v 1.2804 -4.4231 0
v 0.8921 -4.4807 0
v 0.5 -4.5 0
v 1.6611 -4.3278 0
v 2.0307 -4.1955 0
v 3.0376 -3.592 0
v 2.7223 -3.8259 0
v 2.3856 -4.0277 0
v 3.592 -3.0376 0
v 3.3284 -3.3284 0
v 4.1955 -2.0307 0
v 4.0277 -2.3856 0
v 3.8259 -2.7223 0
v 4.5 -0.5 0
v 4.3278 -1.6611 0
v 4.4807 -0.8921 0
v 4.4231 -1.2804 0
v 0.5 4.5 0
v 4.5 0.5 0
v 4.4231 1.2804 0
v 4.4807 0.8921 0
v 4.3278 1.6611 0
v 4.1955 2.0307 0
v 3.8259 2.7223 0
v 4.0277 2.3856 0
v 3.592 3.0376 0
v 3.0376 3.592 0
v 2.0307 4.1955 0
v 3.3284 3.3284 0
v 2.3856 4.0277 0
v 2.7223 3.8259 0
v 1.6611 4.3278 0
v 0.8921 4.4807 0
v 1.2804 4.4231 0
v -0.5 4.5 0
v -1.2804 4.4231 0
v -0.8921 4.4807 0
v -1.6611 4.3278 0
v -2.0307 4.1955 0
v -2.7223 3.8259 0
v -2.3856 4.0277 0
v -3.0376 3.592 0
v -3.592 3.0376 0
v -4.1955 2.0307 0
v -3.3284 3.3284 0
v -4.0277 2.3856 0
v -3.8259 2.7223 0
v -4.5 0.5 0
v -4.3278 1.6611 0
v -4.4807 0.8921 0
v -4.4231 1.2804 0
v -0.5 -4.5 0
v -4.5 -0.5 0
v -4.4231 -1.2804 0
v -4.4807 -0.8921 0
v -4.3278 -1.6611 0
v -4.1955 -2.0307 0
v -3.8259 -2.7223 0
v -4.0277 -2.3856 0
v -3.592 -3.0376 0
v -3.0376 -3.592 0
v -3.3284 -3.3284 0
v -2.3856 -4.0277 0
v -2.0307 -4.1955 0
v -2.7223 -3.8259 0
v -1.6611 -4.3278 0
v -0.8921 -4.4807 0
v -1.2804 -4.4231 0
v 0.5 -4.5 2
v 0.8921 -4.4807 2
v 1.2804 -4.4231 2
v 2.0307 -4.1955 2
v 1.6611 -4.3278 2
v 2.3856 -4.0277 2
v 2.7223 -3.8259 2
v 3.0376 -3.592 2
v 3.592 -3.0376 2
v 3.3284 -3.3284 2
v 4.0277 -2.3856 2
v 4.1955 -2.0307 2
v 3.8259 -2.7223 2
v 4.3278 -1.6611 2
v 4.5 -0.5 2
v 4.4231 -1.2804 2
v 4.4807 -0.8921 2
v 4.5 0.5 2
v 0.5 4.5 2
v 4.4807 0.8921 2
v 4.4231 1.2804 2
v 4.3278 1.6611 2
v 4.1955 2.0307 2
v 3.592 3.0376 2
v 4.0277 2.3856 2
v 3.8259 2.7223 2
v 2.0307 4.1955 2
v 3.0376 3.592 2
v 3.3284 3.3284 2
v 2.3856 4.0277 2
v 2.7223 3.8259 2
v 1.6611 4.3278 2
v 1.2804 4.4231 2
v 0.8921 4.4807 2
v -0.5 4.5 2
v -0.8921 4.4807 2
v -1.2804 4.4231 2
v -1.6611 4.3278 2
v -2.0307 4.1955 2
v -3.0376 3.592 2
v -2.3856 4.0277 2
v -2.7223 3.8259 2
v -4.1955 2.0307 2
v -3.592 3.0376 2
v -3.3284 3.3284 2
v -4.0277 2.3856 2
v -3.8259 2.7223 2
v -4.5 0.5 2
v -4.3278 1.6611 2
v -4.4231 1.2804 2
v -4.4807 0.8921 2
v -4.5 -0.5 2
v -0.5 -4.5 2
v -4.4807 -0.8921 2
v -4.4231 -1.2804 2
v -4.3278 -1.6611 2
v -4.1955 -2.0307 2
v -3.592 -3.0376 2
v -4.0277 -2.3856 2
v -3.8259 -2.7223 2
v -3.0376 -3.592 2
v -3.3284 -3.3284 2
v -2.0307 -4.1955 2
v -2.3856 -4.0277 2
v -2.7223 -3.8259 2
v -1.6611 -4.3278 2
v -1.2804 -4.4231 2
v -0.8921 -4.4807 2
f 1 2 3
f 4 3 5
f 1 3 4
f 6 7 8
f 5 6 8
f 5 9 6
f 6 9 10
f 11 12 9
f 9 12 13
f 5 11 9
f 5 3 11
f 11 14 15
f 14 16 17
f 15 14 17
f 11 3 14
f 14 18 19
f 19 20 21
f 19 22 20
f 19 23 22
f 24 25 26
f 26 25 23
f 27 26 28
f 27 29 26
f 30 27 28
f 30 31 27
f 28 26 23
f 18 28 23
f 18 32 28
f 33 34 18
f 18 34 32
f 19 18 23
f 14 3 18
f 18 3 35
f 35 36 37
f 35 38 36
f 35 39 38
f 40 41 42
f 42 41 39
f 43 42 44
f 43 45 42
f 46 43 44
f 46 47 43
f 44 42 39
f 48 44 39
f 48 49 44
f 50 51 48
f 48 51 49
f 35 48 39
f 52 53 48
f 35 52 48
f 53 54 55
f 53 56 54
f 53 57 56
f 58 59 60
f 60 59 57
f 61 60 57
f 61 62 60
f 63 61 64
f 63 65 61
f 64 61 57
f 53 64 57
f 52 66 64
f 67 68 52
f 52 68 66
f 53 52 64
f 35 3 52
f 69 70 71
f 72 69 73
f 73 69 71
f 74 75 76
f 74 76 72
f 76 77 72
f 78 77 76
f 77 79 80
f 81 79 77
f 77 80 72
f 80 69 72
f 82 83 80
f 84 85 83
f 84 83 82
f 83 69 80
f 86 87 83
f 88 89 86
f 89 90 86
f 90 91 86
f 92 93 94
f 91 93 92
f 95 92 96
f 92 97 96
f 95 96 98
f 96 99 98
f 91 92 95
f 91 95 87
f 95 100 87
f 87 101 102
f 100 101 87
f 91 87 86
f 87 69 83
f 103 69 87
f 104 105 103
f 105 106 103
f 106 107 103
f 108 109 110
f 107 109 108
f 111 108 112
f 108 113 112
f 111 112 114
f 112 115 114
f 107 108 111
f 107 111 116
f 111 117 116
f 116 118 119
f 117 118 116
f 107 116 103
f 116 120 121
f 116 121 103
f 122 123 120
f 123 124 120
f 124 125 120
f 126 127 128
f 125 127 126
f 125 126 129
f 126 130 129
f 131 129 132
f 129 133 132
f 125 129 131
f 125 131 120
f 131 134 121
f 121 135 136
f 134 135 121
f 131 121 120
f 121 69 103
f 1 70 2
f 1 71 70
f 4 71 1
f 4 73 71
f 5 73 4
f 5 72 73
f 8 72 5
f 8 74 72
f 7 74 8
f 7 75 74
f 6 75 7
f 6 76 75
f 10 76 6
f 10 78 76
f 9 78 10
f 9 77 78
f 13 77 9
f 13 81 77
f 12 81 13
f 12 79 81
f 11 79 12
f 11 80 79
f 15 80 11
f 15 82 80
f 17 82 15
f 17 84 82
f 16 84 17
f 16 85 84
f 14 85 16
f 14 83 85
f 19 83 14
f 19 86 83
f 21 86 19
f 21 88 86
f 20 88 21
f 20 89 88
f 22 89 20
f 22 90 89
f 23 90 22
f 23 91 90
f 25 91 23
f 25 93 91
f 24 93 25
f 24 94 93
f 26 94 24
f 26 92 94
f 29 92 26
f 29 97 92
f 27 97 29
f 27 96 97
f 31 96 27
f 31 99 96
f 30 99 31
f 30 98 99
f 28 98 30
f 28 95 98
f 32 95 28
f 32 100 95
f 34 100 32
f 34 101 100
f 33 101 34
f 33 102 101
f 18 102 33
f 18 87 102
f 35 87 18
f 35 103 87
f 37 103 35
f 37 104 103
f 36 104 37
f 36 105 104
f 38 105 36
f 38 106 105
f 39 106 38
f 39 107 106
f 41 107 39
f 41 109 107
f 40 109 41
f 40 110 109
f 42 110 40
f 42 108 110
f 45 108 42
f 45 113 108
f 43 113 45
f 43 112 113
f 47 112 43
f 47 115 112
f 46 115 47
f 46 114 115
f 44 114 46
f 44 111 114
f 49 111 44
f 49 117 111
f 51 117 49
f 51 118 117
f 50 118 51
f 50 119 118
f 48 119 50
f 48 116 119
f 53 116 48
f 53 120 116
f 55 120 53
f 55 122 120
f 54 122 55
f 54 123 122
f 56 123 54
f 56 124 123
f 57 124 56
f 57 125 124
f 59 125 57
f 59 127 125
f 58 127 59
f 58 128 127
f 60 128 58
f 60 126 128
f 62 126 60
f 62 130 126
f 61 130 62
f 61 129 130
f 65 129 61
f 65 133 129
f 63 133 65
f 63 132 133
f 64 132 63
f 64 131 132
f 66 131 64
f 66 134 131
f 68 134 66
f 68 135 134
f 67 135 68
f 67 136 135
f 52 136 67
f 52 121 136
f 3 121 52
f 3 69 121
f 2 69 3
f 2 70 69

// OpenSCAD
// file: lib/logo_plaque.scad
// Raised multi-color logo on a rounded base.
//
//   side view
//
//        ▄▄▄  ▒▒▒▒   ░░    ← logo layers, one per filament
//   ▐████████████████████▌ ← base
//
// Every layer SVG shares one pixel frame, so the layers line up without
// centering each one (centering would use each layer's own outline).

$fn = 64;

BASE_HEIGHT = 2;
LOGO_HEIGHT = 1.2;
BORDER = 3;
CORNER_RADIUS = 4;
AVATAR_FN = 180;
MARK_HEIGHT = 4;
TIE_HEIGHT = 1.2;

// potrace writes one point per pixel, and OpenSCAD reads points as 1/72 inch
MM_PER_FRAME_PX = 25.4 / 72;

module layer_2d(dir, name, frame, width) {
    scale(width / (frame.x * MM_PER_FRAME_PX))
        translate([-frame.x / 2, -frame.y / 2] * MM_PER_FRAME_PX)
            import(str(dir, "/", name, ".svg"));
}

// Earlier layers win where traced outlines overlap, so no two parts share volume.
module clipped_layer_2d(dir, layers, index, frame, width) {
    difference() {
        layer_2d(dir, layers[index][0], frame, width);

        for (earlier = [0:1:index - 1]) {
            layer_2d(dir, layers[earlier][0], frame, width);
        }
    }
}

module rounded_base_2d(frame, width, border, corner_radius) {
    height = width * frame.y / frame.x;

    offset(r = corner_radius)
        square(
            [
                width + (border - corner_radius) * 2,
                height + (border - corner_radius) * 2,
            ],
            center = true
        );
}

// `part` selects one filament for export: "base", a layer name, or "all".
// With `diameter`, the base is a circle instead of a rounded rectangle.
module logo_plaque(
    dir,
    frame,
    width,
    base_color,
    layers,
    part = "all",
    base_height = BASE_HEIGHT,
    logo_height = LOGO_HEIGHT,
    border = BORDER,
    corner_radius = CORNER_RADIUS,
    diameter = undef
) {
    if (part == "all" || part == "base") {
        color(base_color)
            linear_extrude(height = base_height)
                if (is_undef(diameter)) {
                    rounded_base_2d(frame, width, border, corner_radius);
                } else {
                    circle(d = diameter, $fn = AVATAR_FN);
                }
    }

    for (index = [0:1:len(layers) - 1]) {
        if (part == "all" || part == layers[index][0]) {
            color(layers[index][1])
                translate([0, 0, base_height])
                    linear_extrude(height = logo_height)
                        clipped_layer_2d(dir, layers, index, frame, width);
        }
    }
}

// The logo extruded with no base.
//
//   side view
//
//   ████  ████   ▒▒▒▒ ← layers at full height
//   ████▁▁████▁▁▁▒▒▒▒ ← low ties join loose pieces
//
// Each layer is [name, color, has_ties]. Ties are in "<name>_ties.svg", and stop
// at other layers so that no two parts share volume.
//
// With `back_color`, one more filament joins the pieces. The ties, in "ties.svg",
// and the logo's outline form a back layer, and the logo sits on top of it:
//
//   ████  ████   ▒▒▒▒
//   ▄▄▄▄▄▄▄▄▄▄▄▄▄▄▄▄▄ ← back layer, `tie_height` thick
//
// `part` selects one filament for export: "back", a layer name, or "all".
module logo_mark(
    dir,
    frame,
    width,
    layers,
    part = "all",
    height = MARK_HEIGHT,
    tie_height = TIE_HEIGHT,
    back_color = undef,
    back_has_ties = false
) {
    has_back = !is_undef(back_color);
    logo_z = has_back ? tie_height : 0;

    if (has_back && (part == "all" || part == "back")) {
        color(back_color)
            linear_extrude(height = tie_height) {
                for (layer = layers) {
                    layer_2d(dir, layer[0], frame, width);
                }

                if (back_has_ties) {
                    layer_2d(dir, "ties", frame, width);
                }
            }
    }

    for (index = [0:1:len(layers) - 1]) {
        name = layers[index][0];

        if (part == "all" || part == name) {
            color(layers[index][1]) {
                translate([0, 0, logo_z])
                    linear_extrude(height = height - logo_z)
                        clipped_layer_2d(dir, layers, index, frame, width);

                if (layers[index][2]) {
                    linear_extrude(height = tie_height)
                        difference() {
                            layer_2d(dir, str(name, "_ties"), frame, width);

                            for (other = layers) {
                                if (other[0] != name) {
                                    layer_2d(dir, other[0], frame, width);
                                }
                            }
                        }
                }
            }
        }
    }
}
// main file
use <lib/logo_plaque.scad>

logo_plaque("logos/issue_voter.svg", base_style = "rect");
